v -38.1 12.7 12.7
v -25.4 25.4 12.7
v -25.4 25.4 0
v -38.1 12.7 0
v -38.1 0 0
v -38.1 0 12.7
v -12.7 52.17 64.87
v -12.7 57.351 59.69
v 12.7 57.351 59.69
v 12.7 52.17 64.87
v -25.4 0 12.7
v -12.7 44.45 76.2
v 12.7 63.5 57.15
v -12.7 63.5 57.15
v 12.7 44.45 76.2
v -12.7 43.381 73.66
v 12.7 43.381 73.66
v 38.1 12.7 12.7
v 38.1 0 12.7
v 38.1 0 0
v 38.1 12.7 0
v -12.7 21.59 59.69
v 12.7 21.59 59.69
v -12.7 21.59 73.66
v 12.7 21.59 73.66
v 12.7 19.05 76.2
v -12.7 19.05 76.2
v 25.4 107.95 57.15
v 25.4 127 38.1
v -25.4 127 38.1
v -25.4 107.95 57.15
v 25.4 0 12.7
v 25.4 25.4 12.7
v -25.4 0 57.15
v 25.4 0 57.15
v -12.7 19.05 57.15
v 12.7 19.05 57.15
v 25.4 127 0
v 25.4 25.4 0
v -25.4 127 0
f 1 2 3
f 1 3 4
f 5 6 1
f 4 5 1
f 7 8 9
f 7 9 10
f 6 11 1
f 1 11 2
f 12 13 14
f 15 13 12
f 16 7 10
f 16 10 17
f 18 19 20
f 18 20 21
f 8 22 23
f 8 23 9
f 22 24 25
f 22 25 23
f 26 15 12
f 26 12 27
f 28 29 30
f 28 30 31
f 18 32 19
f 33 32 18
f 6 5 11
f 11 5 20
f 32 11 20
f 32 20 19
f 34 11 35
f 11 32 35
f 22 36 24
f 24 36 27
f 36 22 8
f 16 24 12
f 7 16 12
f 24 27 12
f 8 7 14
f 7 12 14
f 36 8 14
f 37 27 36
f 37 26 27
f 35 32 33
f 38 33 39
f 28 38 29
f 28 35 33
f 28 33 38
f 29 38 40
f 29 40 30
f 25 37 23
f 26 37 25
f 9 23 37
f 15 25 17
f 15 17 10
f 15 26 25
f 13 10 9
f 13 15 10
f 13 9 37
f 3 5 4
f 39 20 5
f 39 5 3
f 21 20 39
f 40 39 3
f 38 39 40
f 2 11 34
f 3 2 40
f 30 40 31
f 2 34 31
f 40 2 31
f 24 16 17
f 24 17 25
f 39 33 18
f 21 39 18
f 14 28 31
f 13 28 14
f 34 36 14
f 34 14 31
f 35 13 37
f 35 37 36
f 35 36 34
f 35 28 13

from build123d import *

# Parameters (mm, degrees)
F1_DEPTH = 25.4
F0_W     = 25.4
F0_H     = 12.7
F2_DEPTH = 38.1
F3_DEPTH = 12.7
F5_DEPTH = 12.7
F7_DEPTH = 12.7


with BuildPart() as f1:
    # F0 (on Right) → F1 (new body)
    with BuildSketch(Plane.YZ):
        Polygon((25.4, 12.7), (25.4, 0), (127, 0), (127, 38.1), (107.95, 57.15), (63.5, 57.15), (19.05, 57.15), (0, 57.15), (0, 12.7), align=None)
    extrude(amount=F1_DEPTH)

    # F0 (on Right) → F2 (join)
    with BuildSketch(Plane.YZ):
        with Locations((12.7, 6.35)):
            Rectangle(F0_W, F0_H)
    extrude(amount=F2_DEPTH)

    # F0 (on Right) → F3 (join)
    with BuildSketch(Plane.YZ):
        Polygon((19.05, 76.2), (19.05, 57.15), (63.5, 57.15), (44.45, 76.2), align=None)
    extrude(amount=F3_DEPTH)

    # F4 (on face) → F5 (cut)
    with BuildSketch(Plane.XY.offset(12.7)):
        Polygon((25.4, 25.4), (38.1, 12.7), (38.1, 25.4), align=None)
    extrude(amount=-F5_DEPTH, mode=Mode.SUBTRACT)

    # F6 (on face) → F7 (cut)
    with BuildSketch(Plane.YZ.offset(12.7)):
        Polygon((43.3805931771, 73.66), (21.59, 73.66), (21.59, 59.69), (57.3505931771, 59.69), (52.1702965885, 64.8702965885), align=None)
    extrude(amount=-F7_DEPTH, mode=Mode.SUBTRACT)

    # F8: F1 across plane


with BuildPart() as f1_1:
    add(f1.part)
    add(f1.part.mirror(Plane.YZ))


solid = f1_1.part
